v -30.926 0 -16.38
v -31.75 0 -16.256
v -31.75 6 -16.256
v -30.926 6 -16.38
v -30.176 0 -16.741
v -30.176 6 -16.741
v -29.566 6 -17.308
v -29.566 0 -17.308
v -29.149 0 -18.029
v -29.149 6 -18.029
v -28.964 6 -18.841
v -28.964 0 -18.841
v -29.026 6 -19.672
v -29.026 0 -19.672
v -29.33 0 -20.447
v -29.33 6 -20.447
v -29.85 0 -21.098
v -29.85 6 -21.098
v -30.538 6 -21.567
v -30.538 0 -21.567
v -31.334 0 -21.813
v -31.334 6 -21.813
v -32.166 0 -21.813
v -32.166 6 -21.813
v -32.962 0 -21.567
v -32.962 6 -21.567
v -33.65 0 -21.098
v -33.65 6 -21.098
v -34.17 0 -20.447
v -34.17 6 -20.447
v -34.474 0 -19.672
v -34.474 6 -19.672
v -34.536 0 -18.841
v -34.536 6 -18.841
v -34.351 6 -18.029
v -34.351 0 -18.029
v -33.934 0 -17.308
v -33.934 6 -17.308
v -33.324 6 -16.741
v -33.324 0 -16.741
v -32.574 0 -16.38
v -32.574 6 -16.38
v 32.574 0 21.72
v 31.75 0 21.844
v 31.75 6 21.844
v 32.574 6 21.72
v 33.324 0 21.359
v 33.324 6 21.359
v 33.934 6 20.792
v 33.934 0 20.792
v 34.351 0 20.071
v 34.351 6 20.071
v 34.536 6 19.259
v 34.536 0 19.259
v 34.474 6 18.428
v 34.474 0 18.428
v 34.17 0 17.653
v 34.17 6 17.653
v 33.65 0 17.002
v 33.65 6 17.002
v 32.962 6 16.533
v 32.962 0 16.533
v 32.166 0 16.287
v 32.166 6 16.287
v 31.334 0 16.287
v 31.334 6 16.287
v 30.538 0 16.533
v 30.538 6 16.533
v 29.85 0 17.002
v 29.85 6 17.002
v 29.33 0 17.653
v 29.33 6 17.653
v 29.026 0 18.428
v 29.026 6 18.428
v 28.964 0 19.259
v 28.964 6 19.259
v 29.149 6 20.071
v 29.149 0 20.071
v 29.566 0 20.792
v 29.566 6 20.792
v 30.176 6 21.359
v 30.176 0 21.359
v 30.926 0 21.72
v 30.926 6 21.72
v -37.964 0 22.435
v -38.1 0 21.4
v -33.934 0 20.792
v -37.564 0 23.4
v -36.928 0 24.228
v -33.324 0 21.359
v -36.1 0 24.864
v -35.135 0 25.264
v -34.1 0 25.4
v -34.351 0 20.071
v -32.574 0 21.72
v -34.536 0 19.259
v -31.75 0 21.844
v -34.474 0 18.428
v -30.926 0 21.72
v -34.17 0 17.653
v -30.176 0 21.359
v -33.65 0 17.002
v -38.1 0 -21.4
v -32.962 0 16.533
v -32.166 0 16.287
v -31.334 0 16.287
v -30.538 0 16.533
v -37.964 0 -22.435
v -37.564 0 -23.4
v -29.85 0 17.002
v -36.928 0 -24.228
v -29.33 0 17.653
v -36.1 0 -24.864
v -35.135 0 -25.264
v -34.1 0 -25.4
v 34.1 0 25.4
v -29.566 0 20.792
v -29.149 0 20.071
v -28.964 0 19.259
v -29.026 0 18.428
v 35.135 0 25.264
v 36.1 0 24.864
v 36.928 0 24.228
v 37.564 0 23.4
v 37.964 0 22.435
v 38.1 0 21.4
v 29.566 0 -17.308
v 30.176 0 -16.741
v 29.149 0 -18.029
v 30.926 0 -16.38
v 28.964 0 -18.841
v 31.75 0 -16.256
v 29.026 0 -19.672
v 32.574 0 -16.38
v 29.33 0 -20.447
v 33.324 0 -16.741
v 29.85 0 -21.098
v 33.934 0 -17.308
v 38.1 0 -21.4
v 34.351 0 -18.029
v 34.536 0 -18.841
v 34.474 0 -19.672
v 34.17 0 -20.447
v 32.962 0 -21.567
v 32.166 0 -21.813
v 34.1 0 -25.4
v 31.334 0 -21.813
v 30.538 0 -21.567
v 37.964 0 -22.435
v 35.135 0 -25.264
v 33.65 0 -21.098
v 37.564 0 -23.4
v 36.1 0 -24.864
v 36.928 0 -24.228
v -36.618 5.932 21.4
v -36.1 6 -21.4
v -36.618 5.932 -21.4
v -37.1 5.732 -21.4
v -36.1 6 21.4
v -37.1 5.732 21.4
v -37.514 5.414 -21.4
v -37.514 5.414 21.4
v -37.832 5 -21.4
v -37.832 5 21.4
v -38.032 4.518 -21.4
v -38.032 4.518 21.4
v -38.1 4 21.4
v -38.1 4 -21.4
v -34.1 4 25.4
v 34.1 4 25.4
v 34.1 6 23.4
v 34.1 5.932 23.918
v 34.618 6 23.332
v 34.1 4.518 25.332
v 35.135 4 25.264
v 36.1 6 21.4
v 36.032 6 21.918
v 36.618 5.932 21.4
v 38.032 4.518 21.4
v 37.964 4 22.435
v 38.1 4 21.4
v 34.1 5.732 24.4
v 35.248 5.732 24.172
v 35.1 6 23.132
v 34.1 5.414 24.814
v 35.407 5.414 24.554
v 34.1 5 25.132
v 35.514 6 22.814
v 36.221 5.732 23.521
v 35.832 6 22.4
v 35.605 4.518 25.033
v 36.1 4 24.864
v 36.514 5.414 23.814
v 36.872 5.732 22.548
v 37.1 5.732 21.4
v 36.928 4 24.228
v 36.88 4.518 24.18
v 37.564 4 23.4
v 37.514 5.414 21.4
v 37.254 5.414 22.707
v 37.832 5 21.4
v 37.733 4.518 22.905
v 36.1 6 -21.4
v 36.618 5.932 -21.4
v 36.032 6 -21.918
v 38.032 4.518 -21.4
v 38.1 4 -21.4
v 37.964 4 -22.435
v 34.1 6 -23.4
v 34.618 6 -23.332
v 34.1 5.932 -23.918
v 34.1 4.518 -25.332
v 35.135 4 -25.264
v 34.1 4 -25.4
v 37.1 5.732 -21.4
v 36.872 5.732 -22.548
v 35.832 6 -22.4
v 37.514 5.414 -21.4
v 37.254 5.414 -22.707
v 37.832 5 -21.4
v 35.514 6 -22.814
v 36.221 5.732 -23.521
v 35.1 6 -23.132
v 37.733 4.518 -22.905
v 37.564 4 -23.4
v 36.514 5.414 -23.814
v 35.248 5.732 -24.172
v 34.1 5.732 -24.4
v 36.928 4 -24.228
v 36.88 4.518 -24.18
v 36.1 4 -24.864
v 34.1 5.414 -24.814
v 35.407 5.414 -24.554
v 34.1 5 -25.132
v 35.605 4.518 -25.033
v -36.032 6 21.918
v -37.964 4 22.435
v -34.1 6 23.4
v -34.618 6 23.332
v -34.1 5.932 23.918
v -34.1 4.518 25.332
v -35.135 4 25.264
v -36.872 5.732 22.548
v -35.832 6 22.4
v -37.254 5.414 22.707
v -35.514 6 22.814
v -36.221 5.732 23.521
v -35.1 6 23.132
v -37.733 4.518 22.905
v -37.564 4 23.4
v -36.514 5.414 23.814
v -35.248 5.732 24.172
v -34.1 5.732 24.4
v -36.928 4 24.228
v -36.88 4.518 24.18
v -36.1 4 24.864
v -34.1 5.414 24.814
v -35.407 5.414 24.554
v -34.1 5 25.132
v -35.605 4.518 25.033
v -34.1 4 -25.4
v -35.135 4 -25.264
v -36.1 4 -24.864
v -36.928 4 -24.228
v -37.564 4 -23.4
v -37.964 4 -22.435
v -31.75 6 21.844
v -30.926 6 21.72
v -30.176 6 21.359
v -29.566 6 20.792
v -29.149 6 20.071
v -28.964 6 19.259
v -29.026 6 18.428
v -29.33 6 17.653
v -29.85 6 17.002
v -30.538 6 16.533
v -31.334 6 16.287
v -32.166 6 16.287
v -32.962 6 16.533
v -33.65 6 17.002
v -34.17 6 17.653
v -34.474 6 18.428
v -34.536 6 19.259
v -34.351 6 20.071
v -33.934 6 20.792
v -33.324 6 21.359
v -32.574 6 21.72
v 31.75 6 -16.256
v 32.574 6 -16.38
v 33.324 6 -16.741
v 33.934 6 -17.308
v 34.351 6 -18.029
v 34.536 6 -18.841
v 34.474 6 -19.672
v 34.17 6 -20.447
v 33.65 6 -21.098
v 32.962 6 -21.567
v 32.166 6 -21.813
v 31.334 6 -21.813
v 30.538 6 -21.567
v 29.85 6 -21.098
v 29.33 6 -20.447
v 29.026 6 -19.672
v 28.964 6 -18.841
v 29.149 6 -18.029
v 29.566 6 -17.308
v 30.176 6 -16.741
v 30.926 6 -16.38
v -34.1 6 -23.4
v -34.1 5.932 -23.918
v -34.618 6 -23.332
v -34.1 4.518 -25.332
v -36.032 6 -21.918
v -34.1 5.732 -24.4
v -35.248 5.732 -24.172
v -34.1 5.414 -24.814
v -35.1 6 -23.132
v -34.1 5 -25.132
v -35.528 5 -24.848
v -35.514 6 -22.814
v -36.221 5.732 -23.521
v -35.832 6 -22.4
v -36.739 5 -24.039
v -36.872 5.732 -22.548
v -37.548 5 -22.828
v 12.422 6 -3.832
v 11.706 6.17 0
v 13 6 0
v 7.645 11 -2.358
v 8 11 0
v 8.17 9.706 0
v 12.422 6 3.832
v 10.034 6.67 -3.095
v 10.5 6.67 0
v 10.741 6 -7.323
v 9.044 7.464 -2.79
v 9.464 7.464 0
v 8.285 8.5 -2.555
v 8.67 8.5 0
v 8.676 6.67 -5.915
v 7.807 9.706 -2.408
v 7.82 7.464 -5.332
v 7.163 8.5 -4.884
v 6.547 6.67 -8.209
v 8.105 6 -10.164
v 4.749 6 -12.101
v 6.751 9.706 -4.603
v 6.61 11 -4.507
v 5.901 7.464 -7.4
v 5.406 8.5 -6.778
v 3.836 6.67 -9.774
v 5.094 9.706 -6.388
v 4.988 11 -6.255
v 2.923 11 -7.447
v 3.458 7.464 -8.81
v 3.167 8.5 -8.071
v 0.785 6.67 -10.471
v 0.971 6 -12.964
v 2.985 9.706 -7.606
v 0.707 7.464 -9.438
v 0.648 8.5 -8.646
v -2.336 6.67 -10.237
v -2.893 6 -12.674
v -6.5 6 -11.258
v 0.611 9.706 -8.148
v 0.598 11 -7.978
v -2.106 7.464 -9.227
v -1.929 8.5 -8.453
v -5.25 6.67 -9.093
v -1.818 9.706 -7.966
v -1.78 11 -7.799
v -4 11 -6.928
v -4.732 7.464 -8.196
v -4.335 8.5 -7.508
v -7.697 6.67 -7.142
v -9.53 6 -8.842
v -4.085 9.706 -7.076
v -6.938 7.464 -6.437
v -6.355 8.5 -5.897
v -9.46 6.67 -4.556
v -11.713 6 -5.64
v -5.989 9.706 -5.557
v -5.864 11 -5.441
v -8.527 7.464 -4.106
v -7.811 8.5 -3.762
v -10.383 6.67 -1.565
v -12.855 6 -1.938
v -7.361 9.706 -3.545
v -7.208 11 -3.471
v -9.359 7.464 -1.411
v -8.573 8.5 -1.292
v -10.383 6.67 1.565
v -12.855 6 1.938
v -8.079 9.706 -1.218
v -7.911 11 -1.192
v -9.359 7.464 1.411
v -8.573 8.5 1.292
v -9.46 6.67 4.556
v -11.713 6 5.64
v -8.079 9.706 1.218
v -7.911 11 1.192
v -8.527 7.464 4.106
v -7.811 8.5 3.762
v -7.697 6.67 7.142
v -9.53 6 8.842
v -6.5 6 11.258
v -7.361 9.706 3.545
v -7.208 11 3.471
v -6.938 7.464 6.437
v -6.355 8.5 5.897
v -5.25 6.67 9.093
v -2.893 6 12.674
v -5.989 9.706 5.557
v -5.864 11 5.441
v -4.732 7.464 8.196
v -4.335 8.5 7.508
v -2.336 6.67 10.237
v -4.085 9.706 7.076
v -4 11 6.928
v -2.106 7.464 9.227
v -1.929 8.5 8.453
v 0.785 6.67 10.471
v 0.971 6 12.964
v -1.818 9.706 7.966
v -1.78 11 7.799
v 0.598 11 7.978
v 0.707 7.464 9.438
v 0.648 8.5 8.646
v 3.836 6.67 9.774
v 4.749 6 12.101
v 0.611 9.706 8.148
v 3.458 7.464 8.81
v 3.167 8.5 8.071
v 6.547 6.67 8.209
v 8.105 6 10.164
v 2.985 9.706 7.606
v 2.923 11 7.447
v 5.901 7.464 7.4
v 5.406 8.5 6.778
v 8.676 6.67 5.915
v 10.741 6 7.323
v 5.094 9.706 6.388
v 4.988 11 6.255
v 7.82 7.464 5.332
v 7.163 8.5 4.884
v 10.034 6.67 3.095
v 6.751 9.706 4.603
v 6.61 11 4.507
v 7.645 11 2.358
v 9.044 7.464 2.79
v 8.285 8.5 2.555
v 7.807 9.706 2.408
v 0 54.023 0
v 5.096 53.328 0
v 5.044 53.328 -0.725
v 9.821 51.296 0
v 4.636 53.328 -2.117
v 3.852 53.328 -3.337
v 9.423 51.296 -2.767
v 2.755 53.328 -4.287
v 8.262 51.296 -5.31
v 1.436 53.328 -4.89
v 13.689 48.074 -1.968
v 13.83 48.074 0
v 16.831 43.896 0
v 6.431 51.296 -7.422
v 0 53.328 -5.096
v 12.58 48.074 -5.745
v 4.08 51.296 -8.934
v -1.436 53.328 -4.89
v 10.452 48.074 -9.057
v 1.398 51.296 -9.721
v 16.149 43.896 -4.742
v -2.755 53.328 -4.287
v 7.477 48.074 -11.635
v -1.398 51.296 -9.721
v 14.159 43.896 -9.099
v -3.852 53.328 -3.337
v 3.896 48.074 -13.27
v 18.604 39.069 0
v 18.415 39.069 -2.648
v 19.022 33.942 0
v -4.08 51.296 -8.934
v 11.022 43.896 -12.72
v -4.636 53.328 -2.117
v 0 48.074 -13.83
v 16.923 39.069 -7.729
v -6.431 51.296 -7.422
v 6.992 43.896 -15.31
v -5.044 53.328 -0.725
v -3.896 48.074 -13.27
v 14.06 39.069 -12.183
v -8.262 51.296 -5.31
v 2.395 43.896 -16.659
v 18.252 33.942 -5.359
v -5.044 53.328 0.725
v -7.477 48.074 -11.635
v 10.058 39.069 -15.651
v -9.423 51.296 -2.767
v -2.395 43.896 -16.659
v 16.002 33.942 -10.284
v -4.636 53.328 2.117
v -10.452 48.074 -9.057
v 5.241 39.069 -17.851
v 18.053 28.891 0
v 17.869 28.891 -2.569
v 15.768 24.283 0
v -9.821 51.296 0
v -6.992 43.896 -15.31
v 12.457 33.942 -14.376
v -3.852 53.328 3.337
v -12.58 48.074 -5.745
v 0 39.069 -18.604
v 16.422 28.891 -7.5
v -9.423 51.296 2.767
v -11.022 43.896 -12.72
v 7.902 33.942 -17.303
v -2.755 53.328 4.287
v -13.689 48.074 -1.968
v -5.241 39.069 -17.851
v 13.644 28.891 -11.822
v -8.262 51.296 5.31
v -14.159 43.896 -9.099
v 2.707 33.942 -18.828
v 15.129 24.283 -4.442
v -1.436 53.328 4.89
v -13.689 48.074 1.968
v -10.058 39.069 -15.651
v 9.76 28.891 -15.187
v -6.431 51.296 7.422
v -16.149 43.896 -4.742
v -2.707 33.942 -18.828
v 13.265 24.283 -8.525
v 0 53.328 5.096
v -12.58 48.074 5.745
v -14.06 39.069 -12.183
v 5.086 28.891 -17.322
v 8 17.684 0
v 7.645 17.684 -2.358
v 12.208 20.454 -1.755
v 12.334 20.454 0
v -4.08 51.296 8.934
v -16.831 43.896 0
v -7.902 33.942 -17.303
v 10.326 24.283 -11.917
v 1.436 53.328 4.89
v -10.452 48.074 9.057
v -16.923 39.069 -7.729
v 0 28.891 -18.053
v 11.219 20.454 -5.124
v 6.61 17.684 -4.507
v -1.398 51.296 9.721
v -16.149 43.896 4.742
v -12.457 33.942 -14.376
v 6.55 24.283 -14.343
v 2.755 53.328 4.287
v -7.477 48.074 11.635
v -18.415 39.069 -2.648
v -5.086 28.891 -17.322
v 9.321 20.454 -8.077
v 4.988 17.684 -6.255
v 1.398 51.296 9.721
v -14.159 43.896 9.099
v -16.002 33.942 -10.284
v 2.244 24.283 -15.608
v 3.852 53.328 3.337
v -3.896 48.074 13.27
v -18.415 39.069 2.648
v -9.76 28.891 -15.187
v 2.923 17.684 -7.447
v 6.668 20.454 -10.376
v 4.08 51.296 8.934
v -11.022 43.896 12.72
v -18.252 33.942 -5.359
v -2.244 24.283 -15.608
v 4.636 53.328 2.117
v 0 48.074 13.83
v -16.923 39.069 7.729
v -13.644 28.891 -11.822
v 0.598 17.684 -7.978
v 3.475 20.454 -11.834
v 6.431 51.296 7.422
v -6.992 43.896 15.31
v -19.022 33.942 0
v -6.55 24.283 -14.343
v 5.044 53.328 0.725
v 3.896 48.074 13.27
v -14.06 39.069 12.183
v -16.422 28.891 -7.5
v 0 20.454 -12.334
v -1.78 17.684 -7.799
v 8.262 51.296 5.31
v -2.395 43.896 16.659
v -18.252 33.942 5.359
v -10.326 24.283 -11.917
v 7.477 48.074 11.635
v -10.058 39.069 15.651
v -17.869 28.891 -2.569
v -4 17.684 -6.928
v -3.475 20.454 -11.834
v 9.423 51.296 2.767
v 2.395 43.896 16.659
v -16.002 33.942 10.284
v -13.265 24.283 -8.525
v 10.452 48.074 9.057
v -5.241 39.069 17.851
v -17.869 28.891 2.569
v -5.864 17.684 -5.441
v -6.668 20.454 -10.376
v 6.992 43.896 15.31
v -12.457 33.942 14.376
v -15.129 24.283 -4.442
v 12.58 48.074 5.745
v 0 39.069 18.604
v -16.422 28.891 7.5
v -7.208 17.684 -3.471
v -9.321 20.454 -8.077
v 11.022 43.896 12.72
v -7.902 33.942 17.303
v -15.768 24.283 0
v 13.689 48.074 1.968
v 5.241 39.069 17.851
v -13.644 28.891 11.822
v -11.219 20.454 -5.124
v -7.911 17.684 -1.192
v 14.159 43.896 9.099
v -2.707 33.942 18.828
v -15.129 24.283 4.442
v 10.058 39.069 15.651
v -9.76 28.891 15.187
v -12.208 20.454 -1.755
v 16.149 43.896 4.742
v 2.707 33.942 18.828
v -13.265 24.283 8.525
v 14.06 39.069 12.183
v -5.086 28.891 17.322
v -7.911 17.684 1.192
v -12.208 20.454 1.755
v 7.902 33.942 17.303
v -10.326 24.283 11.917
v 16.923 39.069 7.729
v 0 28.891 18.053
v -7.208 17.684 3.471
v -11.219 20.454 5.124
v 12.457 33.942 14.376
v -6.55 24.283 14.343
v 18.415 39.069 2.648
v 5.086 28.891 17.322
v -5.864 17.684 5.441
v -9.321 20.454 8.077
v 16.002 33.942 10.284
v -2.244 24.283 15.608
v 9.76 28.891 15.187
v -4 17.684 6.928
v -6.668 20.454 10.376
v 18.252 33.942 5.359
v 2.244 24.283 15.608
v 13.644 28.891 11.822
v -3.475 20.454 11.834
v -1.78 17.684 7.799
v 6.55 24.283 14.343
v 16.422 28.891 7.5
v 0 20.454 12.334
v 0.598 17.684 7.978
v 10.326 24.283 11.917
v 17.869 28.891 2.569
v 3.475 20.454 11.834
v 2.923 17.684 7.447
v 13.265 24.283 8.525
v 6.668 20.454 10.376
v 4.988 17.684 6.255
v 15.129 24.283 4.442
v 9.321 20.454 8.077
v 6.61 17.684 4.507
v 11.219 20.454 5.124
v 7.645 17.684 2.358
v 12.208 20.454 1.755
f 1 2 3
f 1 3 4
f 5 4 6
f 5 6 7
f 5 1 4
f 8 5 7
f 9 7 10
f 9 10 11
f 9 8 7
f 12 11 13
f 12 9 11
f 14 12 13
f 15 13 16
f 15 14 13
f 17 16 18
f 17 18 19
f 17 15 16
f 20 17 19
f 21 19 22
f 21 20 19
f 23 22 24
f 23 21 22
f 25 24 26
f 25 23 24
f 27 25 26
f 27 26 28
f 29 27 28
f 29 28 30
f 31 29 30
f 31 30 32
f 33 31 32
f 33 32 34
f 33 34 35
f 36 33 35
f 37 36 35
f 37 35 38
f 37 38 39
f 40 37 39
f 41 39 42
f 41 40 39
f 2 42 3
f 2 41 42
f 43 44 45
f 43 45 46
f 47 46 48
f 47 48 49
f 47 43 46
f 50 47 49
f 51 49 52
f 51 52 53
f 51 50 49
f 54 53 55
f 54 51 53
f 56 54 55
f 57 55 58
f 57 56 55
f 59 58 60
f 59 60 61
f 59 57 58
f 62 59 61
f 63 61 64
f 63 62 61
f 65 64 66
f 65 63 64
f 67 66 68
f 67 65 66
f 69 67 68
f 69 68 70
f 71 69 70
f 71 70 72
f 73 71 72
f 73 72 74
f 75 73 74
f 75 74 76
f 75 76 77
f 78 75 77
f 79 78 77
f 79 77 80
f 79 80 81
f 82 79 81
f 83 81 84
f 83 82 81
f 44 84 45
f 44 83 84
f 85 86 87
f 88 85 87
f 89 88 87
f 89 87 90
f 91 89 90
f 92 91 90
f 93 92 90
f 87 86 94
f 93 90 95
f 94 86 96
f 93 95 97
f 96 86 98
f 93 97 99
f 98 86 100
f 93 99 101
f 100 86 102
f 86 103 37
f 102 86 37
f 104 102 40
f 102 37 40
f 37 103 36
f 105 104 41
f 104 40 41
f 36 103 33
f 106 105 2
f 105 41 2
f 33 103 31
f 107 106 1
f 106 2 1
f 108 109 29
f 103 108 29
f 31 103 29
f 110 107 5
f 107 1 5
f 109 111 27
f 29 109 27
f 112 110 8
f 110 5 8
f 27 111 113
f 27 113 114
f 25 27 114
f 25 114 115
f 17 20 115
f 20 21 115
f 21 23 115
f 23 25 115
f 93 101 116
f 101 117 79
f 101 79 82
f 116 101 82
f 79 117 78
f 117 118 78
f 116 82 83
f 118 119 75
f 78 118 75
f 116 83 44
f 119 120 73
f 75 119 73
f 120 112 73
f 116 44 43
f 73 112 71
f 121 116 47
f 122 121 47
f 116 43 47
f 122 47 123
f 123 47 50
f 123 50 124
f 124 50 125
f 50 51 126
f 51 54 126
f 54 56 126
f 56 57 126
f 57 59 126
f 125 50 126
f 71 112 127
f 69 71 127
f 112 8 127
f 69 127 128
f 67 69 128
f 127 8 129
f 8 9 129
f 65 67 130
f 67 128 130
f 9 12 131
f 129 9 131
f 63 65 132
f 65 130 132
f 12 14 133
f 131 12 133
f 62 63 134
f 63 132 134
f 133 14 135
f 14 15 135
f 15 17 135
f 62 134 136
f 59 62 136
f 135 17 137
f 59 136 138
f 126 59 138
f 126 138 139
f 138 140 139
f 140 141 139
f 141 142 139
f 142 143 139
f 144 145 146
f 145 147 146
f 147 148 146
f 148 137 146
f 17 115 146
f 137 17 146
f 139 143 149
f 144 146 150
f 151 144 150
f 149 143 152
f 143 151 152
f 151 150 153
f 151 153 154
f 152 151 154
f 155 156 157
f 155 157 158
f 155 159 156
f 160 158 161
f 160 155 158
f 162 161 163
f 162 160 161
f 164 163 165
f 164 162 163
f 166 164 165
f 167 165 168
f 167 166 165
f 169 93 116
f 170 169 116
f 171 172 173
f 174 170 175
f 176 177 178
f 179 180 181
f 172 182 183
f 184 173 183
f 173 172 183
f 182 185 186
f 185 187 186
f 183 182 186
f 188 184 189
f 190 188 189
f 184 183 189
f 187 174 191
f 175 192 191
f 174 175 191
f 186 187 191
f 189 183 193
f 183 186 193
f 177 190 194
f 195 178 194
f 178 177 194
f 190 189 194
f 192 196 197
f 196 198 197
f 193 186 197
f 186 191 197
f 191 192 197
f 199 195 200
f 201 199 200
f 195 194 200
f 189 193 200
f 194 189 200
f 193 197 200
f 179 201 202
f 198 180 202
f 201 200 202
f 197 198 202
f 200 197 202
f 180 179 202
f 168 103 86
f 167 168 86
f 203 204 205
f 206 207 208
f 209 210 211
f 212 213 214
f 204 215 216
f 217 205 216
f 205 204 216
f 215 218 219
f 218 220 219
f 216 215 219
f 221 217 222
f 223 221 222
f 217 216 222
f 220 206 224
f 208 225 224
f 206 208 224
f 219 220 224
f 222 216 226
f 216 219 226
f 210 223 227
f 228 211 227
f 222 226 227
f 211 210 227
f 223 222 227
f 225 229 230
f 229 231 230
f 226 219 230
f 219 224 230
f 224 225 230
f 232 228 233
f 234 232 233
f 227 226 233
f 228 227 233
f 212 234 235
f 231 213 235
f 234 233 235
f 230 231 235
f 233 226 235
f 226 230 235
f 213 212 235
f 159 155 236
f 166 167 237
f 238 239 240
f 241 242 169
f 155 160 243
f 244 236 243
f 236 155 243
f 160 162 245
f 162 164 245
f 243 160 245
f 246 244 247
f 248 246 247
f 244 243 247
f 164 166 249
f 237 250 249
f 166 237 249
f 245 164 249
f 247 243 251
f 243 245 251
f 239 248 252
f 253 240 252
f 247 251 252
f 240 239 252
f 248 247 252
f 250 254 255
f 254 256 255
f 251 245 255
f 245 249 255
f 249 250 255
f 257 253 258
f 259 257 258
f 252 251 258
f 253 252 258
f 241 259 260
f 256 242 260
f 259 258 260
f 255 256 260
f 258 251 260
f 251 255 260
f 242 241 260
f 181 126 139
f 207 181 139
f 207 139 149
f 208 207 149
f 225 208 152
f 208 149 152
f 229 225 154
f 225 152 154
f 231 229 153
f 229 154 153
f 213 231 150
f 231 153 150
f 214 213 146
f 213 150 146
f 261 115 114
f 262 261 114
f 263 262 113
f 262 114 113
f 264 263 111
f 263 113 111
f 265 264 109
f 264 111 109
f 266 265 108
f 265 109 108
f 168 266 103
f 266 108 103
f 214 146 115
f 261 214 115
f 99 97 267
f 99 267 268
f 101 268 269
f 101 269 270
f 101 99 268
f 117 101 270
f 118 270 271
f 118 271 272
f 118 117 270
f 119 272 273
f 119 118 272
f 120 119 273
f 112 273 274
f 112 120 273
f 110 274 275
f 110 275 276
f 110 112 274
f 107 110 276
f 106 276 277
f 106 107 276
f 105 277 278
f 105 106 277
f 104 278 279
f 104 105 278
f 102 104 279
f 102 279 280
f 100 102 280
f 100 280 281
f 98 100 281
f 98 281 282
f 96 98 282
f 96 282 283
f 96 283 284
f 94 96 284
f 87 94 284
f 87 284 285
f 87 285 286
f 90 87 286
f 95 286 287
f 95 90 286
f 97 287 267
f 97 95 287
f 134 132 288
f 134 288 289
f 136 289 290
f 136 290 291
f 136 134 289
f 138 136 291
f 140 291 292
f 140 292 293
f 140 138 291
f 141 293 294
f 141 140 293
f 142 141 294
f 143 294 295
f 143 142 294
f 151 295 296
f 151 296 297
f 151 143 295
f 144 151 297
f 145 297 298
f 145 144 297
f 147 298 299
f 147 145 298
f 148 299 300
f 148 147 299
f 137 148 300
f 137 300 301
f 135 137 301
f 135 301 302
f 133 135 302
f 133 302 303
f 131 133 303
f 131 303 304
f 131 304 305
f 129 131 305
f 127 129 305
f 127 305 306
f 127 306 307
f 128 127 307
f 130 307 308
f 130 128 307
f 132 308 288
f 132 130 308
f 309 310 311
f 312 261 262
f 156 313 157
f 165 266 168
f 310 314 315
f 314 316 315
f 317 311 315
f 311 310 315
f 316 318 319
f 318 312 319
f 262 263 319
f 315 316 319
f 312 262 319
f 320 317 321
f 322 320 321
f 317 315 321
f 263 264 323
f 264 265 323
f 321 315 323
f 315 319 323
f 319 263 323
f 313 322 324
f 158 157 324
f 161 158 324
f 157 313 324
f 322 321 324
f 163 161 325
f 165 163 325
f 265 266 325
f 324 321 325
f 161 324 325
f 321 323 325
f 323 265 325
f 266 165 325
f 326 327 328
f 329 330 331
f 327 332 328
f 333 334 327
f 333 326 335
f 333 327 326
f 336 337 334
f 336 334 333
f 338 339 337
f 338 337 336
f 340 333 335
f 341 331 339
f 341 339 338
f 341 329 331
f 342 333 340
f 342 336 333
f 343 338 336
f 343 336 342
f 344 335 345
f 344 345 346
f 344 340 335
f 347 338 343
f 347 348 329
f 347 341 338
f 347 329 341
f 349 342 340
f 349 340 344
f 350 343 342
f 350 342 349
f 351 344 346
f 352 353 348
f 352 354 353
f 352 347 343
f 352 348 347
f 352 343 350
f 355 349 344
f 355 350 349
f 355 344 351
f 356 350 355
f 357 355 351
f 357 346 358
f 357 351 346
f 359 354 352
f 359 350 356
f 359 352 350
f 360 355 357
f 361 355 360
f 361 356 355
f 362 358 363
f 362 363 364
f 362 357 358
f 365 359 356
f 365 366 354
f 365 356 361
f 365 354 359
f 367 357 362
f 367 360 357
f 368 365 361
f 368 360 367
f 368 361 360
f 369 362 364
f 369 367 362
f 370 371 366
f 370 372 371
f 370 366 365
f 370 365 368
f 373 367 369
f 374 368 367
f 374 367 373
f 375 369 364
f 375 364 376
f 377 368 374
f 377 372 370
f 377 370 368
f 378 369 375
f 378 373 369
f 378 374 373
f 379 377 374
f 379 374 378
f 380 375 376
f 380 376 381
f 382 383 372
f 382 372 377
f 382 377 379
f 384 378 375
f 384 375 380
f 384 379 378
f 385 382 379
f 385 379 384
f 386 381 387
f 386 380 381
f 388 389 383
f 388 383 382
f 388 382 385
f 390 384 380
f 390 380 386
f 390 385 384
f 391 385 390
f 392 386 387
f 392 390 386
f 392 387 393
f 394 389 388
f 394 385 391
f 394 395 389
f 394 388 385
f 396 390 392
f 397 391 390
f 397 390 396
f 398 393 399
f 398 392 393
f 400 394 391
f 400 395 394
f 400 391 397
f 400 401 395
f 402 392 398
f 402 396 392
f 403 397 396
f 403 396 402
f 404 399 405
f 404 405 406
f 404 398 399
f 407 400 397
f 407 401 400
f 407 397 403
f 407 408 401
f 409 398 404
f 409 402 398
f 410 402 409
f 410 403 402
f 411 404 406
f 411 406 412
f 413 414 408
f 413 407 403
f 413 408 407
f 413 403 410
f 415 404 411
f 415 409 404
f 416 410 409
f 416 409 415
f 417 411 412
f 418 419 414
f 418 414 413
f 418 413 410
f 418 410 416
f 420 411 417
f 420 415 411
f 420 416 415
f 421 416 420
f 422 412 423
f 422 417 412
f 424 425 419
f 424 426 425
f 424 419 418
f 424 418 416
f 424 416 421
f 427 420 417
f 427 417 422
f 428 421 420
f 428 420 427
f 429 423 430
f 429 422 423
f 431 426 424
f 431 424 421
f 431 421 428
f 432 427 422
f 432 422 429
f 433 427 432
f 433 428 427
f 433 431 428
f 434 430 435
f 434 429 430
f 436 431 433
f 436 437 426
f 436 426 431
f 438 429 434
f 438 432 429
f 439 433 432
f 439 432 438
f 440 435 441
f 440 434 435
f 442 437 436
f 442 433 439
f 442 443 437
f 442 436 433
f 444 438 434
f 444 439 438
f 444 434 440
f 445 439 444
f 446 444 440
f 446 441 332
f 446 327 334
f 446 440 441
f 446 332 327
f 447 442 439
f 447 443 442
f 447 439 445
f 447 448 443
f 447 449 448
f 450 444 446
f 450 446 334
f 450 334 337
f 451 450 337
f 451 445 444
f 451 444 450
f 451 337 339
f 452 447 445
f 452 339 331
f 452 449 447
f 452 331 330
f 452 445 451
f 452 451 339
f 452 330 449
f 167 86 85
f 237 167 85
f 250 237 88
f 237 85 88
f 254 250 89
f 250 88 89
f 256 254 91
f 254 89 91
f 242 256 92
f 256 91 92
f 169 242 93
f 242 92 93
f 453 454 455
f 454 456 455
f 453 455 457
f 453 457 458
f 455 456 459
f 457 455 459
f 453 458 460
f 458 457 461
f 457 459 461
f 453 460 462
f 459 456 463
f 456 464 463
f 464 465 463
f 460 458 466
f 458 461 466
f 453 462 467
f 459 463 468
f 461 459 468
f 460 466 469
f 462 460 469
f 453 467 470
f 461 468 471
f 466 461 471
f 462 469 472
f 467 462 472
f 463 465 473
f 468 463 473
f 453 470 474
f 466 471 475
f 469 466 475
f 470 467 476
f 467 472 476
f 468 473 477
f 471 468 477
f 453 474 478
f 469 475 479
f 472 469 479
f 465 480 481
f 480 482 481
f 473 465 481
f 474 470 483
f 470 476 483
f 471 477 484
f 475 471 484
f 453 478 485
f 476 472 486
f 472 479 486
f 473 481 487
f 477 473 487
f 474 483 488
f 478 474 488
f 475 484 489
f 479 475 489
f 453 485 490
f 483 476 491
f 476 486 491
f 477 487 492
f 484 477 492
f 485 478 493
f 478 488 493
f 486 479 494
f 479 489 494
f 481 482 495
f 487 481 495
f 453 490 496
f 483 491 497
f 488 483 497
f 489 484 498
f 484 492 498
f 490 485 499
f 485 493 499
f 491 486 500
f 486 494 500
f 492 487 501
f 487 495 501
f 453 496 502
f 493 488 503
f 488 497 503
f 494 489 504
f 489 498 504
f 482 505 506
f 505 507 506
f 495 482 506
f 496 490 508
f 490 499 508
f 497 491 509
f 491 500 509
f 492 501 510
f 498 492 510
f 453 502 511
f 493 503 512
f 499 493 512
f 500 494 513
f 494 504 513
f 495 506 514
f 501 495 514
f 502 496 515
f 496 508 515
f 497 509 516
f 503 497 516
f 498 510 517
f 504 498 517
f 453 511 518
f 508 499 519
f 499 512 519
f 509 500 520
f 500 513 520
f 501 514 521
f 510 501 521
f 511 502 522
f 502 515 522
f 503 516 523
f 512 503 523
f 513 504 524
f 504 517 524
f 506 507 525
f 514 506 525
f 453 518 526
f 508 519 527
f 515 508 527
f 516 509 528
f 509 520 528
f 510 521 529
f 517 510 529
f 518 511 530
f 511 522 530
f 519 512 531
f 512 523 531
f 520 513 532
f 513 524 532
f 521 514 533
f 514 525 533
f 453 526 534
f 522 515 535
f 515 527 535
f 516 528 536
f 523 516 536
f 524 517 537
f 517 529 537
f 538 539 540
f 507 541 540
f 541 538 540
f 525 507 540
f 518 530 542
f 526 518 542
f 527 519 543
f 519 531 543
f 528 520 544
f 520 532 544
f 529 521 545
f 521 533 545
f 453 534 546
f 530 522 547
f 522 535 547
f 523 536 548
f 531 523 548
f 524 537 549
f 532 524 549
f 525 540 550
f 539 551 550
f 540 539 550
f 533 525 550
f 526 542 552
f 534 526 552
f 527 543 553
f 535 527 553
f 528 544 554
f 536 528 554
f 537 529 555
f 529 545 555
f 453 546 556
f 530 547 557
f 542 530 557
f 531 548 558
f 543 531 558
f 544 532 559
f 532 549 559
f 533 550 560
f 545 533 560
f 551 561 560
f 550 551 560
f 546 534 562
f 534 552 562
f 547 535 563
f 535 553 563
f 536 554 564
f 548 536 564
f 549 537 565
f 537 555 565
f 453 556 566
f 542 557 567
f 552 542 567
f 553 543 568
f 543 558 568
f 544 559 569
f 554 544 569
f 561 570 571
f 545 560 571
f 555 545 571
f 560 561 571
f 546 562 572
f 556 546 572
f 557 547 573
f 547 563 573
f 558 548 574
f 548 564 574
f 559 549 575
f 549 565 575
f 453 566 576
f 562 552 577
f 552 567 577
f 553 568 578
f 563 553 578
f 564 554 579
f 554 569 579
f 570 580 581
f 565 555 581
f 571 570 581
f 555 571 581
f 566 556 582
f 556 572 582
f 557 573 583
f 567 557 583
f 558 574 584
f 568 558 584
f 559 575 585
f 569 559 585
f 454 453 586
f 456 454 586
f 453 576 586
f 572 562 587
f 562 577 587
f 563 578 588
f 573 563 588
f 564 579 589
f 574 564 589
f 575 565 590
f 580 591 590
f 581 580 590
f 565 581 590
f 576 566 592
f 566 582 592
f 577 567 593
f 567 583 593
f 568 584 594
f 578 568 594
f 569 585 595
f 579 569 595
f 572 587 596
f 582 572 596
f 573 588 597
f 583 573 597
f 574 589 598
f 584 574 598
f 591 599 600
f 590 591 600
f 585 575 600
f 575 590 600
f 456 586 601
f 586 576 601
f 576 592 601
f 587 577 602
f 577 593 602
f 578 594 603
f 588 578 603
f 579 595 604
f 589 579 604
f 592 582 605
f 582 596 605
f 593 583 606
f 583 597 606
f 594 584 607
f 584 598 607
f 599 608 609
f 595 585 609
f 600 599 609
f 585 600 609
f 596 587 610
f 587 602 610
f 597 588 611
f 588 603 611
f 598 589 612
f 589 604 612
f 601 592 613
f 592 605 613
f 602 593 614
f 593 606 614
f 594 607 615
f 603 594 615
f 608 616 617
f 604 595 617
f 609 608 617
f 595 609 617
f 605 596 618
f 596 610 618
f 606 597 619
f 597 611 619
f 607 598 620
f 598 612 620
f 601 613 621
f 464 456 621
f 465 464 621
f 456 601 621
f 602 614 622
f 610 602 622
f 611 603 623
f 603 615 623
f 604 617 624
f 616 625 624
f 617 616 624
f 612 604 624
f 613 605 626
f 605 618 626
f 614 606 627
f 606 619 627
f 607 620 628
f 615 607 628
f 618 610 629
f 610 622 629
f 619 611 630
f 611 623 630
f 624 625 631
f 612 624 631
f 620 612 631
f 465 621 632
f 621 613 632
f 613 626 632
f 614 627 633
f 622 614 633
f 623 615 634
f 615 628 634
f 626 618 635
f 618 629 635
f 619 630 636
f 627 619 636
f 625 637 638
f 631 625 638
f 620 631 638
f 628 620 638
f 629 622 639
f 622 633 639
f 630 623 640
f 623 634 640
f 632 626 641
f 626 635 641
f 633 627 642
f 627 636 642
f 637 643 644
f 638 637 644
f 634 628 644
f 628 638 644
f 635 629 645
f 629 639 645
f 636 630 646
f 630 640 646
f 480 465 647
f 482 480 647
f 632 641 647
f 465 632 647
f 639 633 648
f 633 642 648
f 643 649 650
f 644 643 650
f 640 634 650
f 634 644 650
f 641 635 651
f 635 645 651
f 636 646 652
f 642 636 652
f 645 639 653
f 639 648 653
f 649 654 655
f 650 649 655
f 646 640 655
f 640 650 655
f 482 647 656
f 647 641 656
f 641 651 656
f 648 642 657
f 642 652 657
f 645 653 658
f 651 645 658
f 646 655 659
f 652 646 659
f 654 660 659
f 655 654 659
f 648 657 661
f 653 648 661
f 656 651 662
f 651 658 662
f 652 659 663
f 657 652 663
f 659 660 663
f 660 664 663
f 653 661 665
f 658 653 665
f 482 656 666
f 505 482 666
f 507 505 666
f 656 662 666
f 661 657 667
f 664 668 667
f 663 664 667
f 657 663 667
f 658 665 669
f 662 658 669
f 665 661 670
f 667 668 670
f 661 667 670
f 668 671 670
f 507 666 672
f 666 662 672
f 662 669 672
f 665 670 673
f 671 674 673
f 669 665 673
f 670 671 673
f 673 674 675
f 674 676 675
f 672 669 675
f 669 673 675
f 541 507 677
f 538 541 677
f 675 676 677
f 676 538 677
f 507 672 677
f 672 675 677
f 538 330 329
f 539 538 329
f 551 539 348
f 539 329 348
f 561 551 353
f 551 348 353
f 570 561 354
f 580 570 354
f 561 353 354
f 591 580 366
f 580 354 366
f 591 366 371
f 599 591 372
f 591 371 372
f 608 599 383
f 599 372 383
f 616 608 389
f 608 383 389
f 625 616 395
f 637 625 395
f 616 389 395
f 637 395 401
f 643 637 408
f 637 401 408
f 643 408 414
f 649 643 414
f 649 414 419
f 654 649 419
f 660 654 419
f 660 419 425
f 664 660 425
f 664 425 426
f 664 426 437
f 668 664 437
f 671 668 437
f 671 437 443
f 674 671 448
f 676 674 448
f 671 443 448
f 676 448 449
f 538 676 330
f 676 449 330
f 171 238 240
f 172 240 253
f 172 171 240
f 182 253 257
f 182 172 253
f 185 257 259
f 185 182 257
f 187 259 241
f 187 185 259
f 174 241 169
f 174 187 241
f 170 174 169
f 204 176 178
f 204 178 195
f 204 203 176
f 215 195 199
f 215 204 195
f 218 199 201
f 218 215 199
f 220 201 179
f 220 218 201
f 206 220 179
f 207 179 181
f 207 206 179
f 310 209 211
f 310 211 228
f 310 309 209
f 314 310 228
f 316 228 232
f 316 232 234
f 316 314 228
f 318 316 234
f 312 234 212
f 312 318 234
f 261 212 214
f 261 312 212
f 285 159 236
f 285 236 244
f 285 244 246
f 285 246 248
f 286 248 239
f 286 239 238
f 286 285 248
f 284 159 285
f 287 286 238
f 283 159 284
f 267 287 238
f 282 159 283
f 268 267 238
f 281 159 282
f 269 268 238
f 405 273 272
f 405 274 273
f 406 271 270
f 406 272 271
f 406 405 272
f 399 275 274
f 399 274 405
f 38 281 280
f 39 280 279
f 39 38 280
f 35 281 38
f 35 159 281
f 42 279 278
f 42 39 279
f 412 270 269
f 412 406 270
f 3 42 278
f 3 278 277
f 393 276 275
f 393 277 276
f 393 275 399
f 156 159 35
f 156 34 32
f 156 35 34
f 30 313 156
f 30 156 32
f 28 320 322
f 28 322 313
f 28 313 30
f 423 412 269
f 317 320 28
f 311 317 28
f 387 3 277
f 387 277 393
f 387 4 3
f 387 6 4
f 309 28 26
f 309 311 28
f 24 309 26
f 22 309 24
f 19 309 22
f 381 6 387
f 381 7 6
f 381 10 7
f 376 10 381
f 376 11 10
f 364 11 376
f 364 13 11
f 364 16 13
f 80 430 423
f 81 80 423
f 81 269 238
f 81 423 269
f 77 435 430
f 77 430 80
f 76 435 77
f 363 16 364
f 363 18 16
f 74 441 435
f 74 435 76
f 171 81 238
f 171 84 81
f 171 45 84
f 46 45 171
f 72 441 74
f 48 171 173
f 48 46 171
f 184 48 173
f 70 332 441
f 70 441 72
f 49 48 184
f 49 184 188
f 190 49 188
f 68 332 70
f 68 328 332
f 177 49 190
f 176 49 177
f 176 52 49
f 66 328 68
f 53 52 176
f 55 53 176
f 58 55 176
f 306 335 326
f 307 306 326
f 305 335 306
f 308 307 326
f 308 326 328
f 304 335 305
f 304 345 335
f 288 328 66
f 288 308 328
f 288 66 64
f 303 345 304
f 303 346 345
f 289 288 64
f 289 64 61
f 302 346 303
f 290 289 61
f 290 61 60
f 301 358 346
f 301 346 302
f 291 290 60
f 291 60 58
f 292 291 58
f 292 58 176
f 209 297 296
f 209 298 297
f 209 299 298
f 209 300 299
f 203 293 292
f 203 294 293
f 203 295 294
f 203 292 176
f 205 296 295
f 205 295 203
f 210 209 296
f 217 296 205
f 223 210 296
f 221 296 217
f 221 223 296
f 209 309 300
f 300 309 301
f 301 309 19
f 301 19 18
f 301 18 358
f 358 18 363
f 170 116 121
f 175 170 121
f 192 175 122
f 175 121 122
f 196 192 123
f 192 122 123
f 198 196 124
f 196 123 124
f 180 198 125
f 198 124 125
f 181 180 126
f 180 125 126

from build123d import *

# Parameters (mm, degrees)
SKETCH1_R           = 2.794
BOSS_EXTRUDE1_DEPTH = 6
FILLET1_R           = 5
FILLET2_R           = 2


with BuildPart() as part:
    # Sketch1 → Boss-Extrude1 (new body)
    with BuildSketch(Plane(origin=(0, 0, 0), x_dir=(1, 0, 0), z_dir=(0, 1, 0))):
        with BuildLine():
            Line((-34.1, -25.4), (34.1, -25.4))
            ThreePointArc((34.1, -25.4), (36.928427125, -24.228427125), (38.1, -21.4))
            Line((38.1, -21.4), (38.1, 21.4))
            ThreePointArc((38.1, 21.4), (36.928427125, 24.228427125), (34.1, 25.4))
            Line((34.1, 25.4), (-34.1, 25.4))
            ThreePointArc((-34.1, 25.4), (-36.928427125, 24.228427125), (-38.1, 21.4))
            Line((-38.1, 21.4), (-38.1, -21.4))
            ThreePointArc((-38.1, -21.4), (-36.928427125, -24.228427125), (-34.1, -25.4))
        make_face()
        with Locations(Location((-31.75, 19.05, 0), (0, 0, 270))):
            Circle(SKETCH1_R, mode=Mode.SUBTRACT)
        with Locations(Location((31.75, 19.05, 0), (0, 0, 270))):
            Circle(SKETCH1_R, mode=Mode.SUBTRACT)
        with Locations(Location((31.75, -19.05, 0), (0, 0, 270))):
            Circle(SKETCH1_R, mode=Mode.SUBTRACT)
        with Locations(Location((-31.75, -19.05, 0), (0, 0, 270))):
            Circle(SKETCH1_R, mode=Mode.SUBTRACT)
    extrude(amount=BOSS_EXTRUDE1_DEPTH)

    # Sketch2 → Revolve1 (revolve)
    with BuildSketch(Plane.XY, mode=Mode.PRIVATE) as revolve1_sk:
        with BuildLine():
            Line((0, 6), (0, 54.022796951))
            ThreePointArc((0, 54.022796951), (-18.604489806, 39.068582473), (-8, 17.684))
            Line((-8, 17.684), (-8, 6))
            Line((-8, 6), (0, 6))
        make_face()
    revolve(revolve1_sk.sketch.rotate(Axis((0, 6, 0), (0, 1, 0)), 180), axis=Axis((0, 6, 0), (0, 1, 0)))

    # Fillet1
    fillet1_edges = [part.edges().sort_by_distance(p)[0] for p in [
        (-8, 6, 0),
    ]]
    fillet(fillet1_edges, radius=FILLET1_R)

    # Fillet2
    fillet2_edges = [part.edges().sort_by_distance(p)[0] for p in [
        (-36.928427125, 6, -24.228427125),
        (-38.1, 6, 0),
        (-36.928427125, 6, 24.228427125),
        (0, 6, 25.4),
        (36.928427125, 6, 24.228427125),
        (38.1, 6, 0),
        (36.928427125, 6, -24.228427125),
        (0, 6, -25.4),
    ]]
    fillet(fillet2_edges, radius=FILLET2_R)


solid = part.part
